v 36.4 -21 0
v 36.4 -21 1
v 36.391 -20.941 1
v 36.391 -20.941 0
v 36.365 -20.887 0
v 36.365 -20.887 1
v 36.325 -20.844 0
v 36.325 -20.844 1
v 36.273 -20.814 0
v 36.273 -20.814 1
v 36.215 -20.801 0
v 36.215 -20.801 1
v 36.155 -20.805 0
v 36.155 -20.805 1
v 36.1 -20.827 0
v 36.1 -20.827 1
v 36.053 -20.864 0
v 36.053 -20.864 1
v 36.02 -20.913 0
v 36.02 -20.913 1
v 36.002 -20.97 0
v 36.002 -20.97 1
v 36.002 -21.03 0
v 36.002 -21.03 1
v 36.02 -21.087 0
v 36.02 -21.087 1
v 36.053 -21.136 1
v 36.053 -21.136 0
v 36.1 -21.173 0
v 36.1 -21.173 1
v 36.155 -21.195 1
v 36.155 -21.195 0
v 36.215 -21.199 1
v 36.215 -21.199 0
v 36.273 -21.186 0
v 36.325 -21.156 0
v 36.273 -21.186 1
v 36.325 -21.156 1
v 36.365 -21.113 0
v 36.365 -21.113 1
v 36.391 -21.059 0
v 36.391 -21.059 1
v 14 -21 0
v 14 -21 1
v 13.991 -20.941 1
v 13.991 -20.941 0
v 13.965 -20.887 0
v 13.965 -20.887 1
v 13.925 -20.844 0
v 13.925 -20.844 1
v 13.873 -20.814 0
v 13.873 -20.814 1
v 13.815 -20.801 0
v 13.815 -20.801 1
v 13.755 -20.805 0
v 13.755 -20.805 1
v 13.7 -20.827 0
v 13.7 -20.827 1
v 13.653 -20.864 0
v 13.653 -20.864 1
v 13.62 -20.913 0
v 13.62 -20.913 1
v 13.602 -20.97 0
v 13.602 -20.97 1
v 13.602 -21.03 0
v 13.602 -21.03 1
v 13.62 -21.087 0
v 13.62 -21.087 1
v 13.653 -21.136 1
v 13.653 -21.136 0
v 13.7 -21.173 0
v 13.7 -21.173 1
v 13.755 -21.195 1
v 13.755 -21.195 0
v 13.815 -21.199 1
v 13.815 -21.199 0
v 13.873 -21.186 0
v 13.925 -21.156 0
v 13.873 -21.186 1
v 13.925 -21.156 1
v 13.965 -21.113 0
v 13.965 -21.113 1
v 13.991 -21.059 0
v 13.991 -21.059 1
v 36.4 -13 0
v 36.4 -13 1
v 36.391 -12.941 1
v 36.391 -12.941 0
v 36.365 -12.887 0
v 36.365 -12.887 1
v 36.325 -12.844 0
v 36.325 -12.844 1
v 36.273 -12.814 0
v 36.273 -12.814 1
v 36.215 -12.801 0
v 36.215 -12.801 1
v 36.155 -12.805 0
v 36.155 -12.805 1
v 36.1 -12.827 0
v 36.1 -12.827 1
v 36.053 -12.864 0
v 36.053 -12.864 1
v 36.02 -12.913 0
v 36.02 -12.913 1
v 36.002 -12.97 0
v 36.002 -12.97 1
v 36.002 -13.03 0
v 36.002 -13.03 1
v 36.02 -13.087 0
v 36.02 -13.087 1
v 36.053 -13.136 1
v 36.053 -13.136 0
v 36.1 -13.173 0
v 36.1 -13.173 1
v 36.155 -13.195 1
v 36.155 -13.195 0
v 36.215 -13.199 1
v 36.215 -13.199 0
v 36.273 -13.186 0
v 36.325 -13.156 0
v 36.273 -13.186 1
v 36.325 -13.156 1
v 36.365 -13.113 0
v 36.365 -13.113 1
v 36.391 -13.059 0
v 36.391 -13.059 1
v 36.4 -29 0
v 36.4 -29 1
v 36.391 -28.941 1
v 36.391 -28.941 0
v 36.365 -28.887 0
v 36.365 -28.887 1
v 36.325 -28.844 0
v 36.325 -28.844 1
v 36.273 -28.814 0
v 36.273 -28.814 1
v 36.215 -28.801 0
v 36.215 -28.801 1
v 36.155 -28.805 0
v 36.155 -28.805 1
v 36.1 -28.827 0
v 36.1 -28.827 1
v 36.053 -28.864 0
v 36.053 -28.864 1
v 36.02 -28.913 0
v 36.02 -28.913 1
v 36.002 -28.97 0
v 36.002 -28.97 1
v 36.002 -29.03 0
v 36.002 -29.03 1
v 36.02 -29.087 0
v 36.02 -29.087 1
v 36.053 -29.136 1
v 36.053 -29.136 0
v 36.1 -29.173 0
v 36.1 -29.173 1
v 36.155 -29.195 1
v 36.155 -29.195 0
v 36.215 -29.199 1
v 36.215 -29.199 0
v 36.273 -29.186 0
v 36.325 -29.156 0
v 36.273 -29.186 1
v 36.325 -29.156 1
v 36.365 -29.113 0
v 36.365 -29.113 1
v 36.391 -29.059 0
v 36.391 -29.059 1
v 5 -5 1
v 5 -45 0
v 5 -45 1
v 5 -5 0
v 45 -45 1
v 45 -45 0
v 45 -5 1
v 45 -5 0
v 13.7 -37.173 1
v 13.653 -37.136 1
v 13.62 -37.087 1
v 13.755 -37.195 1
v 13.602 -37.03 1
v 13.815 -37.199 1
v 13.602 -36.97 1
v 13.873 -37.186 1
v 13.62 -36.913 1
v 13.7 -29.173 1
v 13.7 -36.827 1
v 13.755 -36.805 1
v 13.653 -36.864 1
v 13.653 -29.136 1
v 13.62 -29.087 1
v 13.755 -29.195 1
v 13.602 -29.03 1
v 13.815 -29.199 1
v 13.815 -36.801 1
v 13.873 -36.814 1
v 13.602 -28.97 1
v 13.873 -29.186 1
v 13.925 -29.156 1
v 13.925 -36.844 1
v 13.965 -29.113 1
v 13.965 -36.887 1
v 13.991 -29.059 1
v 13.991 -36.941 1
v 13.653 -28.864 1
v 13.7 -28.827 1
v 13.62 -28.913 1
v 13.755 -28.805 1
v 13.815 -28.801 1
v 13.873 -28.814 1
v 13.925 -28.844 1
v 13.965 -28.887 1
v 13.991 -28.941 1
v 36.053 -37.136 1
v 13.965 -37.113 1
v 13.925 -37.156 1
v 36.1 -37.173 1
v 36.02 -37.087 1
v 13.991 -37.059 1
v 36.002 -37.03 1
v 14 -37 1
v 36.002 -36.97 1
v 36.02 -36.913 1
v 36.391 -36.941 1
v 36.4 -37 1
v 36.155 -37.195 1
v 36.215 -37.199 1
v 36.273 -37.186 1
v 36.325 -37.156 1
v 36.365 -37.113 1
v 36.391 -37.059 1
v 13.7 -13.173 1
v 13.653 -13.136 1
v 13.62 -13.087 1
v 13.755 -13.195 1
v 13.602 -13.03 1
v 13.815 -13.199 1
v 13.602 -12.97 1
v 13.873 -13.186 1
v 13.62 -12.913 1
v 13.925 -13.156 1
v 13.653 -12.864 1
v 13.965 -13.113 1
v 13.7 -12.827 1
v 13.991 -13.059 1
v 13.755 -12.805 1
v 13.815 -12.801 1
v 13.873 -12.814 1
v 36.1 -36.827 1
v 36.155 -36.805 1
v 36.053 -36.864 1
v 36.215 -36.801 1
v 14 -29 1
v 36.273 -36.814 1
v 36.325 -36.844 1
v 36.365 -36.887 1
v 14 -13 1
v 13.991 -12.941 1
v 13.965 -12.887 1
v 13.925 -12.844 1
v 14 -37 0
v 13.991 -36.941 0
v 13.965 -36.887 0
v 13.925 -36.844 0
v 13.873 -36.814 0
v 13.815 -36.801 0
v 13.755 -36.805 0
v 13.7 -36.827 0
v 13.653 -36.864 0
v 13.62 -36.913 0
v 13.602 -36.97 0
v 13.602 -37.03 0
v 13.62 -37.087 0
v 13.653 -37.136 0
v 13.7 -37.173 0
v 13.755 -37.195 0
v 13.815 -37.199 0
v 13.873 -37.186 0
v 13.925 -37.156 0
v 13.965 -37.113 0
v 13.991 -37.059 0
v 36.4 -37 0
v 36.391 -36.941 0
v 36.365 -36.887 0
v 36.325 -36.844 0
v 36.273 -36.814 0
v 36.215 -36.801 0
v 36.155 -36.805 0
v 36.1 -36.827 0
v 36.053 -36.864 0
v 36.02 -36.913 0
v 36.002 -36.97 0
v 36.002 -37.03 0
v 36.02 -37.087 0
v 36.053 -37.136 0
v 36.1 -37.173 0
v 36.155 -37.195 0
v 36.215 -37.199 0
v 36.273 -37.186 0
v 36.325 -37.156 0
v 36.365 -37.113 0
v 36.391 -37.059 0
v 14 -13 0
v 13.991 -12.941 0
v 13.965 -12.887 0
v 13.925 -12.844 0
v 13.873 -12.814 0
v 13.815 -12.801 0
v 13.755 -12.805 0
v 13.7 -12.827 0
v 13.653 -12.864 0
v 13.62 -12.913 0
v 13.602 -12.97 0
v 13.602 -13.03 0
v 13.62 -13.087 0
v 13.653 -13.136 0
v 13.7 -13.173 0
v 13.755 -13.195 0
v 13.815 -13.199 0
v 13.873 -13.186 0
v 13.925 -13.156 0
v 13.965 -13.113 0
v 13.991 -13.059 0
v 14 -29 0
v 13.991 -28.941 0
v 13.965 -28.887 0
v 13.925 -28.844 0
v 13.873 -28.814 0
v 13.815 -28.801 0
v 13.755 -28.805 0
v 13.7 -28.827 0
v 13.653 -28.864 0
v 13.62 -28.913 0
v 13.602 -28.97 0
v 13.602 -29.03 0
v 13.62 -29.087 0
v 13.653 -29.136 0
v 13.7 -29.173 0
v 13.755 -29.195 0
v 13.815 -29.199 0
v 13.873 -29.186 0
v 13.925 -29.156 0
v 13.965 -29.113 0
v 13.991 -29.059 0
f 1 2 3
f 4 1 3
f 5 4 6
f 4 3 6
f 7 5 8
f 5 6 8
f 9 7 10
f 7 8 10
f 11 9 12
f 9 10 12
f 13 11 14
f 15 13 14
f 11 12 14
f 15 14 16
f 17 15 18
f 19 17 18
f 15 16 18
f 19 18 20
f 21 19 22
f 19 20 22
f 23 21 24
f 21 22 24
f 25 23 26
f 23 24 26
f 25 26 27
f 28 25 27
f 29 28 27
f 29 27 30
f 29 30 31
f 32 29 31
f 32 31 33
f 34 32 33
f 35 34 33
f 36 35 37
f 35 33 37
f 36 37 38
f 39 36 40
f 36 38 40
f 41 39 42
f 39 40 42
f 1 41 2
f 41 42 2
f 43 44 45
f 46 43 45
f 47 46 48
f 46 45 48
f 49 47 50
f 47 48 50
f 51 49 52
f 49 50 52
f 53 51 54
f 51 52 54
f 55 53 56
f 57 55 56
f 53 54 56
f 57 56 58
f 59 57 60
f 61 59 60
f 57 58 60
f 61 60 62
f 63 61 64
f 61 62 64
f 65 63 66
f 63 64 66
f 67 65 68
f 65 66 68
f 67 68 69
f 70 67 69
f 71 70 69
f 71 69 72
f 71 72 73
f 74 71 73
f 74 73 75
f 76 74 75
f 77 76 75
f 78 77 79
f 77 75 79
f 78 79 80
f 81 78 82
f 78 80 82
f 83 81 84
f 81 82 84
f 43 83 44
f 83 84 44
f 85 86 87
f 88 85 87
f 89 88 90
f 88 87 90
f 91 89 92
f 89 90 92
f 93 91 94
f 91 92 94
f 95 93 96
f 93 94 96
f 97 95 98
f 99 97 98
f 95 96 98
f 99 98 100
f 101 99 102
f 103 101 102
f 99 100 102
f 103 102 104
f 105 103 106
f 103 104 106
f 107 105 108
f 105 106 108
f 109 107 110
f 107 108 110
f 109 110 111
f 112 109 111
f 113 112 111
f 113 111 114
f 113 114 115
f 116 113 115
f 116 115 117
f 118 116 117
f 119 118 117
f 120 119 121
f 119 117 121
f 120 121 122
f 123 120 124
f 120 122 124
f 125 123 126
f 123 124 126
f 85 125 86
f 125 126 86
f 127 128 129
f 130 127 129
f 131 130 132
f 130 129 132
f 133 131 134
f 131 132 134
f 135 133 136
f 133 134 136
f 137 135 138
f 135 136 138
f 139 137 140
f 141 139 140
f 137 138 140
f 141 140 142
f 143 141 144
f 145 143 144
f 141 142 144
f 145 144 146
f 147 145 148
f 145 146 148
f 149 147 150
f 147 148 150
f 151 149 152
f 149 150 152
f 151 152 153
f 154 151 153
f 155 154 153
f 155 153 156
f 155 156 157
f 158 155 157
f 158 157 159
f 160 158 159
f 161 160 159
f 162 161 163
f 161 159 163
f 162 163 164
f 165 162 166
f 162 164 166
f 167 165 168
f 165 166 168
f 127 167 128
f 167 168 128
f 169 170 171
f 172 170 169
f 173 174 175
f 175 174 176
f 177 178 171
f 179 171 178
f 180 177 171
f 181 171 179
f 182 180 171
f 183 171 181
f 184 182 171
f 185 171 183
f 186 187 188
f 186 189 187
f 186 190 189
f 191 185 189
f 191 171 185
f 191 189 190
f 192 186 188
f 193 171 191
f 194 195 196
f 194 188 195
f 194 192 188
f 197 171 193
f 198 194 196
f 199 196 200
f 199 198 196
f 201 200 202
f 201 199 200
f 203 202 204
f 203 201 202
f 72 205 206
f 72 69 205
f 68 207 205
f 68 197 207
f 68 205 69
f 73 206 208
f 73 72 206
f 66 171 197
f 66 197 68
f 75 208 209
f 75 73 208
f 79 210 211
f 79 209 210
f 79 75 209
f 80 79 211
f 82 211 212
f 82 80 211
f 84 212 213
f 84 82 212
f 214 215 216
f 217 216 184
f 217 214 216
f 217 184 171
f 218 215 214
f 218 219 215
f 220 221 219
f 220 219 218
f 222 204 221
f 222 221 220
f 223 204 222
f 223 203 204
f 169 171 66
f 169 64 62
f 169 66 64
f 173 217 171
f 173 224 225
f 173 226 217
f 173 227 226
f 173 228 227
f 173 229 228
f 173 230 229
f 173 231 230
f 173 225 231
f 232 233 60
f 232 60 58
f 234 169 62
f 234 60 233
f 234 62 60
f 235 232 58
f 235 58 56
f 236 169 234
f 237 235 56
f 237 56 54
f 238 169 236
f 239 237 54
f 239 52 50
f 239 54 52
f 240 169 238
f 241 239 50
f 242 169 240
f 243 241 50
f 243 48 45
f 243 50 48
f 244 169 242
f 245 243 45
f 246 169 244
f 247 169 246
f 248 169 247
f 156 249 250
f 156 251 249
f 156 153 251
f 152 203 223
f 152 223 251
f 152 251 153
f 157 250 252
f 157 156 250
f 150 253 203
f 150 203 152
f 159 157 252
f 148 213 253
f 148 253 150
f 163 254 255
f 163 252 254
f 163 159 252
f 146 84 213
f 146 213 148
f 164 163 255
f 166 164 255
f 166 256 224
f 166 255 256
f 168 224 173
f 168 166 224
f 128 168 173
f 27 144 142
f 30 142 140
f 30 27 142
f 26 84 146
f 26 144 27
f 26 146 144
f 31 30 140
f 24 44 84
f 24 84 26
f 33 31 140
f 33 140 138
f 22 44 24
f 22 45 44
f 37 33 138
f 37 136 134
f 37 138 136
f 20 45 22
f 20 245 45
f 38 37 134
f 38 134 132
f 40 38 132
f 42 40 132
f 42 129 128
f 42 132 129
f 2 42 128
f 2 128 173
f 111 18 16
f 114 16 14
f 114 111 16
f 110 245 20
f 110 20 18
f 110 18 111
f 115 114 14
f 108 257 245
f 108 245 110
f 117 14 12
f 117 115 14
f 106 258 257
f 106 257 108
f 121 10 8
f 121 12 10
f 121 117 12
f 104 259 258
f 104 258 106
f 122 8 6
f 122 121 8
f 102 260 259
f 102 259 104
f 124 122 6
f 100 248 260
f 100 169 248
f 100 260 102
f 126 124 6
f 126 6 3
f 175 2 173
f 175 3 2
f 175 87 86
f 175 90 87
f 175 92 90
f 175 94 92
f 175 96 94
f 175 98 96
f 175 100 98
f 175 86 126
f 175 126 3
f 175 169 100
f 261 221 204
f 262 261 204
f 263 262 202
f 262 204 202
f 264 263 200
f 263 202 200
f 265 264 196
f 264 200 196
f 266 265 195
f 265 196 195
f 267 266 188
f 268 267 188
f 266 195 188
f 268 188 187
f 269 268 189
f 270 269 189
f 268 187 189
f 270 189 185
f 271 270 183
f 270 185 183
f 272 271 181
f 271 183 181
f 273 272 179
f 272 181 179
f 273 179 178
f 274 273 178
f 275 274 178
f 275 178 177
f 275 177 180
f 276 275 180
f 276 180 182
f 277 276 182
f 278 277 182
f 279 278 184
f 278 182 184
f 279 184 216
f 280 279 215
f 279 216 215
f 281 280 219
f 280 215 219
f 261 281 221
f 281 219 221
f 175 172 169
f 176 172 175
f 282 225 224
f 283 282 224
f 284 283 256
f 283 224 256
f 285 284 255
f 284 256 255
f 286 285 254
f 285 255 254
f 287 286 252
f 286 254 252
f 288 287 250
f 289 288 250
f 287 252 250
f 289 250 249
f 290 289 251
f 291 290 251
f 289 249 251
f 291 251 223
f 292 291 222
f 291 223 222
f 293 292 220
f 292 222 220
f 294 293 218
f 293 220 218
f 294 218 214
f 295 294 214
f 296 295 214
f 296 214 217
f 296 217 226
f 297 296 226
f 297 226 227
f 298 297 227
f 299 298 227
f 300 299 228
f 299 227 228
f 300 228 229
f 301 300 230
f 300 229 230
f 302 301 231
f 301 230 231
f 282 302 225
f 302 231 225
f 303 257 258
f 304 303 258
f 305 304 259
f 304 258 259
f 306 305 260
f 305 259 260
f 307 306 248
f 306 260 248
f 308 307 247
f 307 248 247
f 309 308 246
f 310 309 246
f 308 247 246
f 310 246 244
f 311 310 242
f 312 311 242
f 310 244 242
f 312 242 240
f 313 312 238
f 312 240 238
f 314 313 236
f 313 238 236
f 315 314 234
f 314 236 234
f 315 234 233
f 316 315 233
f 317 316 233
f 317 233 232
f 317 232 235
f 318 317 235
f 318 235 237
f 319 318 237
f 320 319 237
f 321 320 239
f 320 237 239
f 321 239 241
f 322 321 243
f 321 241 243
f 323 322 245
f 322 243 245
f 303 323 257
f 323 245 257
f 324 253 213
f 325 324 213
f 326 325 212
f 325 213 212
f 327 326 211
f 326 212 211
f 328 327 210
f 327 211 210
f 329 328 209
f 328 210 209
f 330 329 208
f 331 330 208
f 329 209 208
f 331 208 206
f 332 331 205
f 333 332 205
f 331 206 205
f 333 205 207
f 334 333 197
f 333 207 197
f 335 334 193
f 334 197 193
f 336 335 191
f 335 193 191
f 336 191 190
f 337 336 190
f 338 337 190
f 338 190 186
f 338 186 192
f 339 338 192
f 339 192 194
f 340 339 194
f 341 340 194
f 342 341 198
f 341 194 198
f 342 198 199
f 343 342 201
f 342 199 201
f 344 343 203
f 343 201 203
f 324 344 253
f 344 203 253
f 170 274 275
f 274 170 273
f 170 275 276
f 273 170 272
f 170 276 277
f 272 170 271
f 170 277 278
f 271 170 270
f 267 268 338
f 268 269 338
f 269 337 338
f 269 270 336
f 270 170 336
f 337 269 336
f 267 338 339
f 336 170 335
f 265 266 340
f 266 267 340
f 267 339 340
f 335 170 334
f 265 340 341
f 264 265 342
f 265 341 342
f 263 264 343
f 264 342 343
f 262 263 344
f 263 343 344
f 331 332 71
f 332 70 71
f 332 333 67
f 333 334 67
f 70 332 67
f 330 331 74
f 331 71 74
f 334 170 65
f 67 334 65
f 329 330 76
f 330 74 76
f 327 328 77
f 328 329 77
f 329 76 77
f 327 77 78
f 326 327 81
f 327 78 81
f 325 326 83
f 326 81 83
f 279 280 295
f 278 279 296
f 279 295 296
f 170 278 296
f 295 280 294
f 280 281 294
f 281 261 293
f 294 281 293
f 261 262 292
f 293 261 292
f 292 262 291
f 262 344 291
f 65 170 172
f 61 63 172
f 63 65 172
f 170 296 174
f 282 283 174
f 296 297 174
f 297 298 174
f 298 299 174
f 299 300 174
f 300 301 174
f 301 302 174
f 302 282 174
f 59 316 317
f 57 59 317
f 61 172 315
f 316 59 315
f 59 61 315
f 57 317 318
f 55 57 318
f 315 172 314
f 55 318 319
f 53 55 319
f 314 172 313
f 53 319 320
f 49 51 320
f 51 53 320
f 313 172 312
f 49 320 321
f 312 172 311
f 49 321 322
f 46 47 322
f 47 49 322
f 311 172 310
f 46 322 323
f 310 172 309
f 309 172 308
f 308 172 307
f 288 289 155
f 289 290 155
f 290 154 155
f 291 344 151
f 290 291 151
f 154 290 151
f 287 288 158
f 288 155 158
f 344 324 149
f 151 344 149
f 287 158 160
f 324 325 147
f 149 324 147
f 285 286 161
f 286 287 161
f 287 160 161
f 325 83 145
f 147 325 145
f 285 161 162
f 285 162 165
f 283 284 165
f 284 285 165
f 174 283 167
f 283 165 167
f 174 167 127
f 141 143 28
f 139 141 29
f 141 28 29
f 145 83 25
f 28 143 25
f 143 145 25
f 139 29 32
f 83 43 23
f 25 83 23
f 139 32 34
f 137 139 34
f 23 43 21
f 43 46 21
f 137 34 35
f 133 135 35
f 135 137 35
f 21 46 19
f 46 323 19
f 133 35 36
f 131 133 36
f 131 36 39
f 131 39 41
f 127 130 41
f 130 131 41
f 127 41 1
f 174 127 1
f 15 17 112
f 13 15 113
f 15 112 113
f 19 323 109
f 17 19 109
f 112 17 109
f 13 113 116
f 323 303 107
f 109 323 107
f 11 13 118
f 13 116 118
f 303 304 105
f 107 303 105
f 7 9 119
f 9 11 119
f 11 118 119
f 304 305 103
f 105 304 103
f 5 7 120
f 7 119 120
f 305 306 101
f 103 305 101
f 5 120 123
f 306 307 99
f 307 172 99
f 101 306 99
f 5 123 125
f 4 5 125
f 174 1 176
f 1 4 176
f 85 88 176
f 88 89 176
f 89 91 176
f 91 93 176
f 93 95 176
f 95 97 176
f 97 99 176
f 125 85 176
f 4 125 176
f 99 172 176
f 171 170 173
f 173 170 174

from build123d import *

# Parameters (mm, degrees)
SKETCH1_W           = 40
SKETCH1_H           = 40
BOSS_EXTRUDE1_DEPTH = 1
SKETCH2_R           = 0.2
CUT_EXTRUDE1_DEPTH  = 1


with BuildPart() as part:
    # Sketch1 → Boss-Extrude1 (new body)
    with BuildSketch(Plane.XY):
        with Locations((25, -25)):
            Rectangle(SKETCH1_W, SKETCH1_H)
    extrude(amount=BOSS_EXTRUDE1_DEPTH)

    # Sketch2 → Cut-Extrude1 (cut)
    with BuildSketch(Plane.XY.offset(1)):
        with Locations((13.8, -13)):
            Circle(SKETCH2_R)
        with Locations((36.2, -13)):
            Circle(SKETCH2_R)
        with Locations((36.2, -21)):
            Circle(SKETCH2_R)
        with Locations((13.8, -21)):
            Circle(SKETCH2_R)
        with Locations((13.8, -29)):
            Circle(SKETCH2_R)
        with Locations((36.2, -29)):
            Circle(SKETCH2_R)
        with Locations((36.2, -37)):
            Circle(SKETCH2_R)
        with Locations((13.8, -37)):
            Circle(SKETCH2_R)
    extrude(amount=-CUT_EXTRUDE1_DEPTH, mode=Mode.SUBTRACT)


solid = part.part
